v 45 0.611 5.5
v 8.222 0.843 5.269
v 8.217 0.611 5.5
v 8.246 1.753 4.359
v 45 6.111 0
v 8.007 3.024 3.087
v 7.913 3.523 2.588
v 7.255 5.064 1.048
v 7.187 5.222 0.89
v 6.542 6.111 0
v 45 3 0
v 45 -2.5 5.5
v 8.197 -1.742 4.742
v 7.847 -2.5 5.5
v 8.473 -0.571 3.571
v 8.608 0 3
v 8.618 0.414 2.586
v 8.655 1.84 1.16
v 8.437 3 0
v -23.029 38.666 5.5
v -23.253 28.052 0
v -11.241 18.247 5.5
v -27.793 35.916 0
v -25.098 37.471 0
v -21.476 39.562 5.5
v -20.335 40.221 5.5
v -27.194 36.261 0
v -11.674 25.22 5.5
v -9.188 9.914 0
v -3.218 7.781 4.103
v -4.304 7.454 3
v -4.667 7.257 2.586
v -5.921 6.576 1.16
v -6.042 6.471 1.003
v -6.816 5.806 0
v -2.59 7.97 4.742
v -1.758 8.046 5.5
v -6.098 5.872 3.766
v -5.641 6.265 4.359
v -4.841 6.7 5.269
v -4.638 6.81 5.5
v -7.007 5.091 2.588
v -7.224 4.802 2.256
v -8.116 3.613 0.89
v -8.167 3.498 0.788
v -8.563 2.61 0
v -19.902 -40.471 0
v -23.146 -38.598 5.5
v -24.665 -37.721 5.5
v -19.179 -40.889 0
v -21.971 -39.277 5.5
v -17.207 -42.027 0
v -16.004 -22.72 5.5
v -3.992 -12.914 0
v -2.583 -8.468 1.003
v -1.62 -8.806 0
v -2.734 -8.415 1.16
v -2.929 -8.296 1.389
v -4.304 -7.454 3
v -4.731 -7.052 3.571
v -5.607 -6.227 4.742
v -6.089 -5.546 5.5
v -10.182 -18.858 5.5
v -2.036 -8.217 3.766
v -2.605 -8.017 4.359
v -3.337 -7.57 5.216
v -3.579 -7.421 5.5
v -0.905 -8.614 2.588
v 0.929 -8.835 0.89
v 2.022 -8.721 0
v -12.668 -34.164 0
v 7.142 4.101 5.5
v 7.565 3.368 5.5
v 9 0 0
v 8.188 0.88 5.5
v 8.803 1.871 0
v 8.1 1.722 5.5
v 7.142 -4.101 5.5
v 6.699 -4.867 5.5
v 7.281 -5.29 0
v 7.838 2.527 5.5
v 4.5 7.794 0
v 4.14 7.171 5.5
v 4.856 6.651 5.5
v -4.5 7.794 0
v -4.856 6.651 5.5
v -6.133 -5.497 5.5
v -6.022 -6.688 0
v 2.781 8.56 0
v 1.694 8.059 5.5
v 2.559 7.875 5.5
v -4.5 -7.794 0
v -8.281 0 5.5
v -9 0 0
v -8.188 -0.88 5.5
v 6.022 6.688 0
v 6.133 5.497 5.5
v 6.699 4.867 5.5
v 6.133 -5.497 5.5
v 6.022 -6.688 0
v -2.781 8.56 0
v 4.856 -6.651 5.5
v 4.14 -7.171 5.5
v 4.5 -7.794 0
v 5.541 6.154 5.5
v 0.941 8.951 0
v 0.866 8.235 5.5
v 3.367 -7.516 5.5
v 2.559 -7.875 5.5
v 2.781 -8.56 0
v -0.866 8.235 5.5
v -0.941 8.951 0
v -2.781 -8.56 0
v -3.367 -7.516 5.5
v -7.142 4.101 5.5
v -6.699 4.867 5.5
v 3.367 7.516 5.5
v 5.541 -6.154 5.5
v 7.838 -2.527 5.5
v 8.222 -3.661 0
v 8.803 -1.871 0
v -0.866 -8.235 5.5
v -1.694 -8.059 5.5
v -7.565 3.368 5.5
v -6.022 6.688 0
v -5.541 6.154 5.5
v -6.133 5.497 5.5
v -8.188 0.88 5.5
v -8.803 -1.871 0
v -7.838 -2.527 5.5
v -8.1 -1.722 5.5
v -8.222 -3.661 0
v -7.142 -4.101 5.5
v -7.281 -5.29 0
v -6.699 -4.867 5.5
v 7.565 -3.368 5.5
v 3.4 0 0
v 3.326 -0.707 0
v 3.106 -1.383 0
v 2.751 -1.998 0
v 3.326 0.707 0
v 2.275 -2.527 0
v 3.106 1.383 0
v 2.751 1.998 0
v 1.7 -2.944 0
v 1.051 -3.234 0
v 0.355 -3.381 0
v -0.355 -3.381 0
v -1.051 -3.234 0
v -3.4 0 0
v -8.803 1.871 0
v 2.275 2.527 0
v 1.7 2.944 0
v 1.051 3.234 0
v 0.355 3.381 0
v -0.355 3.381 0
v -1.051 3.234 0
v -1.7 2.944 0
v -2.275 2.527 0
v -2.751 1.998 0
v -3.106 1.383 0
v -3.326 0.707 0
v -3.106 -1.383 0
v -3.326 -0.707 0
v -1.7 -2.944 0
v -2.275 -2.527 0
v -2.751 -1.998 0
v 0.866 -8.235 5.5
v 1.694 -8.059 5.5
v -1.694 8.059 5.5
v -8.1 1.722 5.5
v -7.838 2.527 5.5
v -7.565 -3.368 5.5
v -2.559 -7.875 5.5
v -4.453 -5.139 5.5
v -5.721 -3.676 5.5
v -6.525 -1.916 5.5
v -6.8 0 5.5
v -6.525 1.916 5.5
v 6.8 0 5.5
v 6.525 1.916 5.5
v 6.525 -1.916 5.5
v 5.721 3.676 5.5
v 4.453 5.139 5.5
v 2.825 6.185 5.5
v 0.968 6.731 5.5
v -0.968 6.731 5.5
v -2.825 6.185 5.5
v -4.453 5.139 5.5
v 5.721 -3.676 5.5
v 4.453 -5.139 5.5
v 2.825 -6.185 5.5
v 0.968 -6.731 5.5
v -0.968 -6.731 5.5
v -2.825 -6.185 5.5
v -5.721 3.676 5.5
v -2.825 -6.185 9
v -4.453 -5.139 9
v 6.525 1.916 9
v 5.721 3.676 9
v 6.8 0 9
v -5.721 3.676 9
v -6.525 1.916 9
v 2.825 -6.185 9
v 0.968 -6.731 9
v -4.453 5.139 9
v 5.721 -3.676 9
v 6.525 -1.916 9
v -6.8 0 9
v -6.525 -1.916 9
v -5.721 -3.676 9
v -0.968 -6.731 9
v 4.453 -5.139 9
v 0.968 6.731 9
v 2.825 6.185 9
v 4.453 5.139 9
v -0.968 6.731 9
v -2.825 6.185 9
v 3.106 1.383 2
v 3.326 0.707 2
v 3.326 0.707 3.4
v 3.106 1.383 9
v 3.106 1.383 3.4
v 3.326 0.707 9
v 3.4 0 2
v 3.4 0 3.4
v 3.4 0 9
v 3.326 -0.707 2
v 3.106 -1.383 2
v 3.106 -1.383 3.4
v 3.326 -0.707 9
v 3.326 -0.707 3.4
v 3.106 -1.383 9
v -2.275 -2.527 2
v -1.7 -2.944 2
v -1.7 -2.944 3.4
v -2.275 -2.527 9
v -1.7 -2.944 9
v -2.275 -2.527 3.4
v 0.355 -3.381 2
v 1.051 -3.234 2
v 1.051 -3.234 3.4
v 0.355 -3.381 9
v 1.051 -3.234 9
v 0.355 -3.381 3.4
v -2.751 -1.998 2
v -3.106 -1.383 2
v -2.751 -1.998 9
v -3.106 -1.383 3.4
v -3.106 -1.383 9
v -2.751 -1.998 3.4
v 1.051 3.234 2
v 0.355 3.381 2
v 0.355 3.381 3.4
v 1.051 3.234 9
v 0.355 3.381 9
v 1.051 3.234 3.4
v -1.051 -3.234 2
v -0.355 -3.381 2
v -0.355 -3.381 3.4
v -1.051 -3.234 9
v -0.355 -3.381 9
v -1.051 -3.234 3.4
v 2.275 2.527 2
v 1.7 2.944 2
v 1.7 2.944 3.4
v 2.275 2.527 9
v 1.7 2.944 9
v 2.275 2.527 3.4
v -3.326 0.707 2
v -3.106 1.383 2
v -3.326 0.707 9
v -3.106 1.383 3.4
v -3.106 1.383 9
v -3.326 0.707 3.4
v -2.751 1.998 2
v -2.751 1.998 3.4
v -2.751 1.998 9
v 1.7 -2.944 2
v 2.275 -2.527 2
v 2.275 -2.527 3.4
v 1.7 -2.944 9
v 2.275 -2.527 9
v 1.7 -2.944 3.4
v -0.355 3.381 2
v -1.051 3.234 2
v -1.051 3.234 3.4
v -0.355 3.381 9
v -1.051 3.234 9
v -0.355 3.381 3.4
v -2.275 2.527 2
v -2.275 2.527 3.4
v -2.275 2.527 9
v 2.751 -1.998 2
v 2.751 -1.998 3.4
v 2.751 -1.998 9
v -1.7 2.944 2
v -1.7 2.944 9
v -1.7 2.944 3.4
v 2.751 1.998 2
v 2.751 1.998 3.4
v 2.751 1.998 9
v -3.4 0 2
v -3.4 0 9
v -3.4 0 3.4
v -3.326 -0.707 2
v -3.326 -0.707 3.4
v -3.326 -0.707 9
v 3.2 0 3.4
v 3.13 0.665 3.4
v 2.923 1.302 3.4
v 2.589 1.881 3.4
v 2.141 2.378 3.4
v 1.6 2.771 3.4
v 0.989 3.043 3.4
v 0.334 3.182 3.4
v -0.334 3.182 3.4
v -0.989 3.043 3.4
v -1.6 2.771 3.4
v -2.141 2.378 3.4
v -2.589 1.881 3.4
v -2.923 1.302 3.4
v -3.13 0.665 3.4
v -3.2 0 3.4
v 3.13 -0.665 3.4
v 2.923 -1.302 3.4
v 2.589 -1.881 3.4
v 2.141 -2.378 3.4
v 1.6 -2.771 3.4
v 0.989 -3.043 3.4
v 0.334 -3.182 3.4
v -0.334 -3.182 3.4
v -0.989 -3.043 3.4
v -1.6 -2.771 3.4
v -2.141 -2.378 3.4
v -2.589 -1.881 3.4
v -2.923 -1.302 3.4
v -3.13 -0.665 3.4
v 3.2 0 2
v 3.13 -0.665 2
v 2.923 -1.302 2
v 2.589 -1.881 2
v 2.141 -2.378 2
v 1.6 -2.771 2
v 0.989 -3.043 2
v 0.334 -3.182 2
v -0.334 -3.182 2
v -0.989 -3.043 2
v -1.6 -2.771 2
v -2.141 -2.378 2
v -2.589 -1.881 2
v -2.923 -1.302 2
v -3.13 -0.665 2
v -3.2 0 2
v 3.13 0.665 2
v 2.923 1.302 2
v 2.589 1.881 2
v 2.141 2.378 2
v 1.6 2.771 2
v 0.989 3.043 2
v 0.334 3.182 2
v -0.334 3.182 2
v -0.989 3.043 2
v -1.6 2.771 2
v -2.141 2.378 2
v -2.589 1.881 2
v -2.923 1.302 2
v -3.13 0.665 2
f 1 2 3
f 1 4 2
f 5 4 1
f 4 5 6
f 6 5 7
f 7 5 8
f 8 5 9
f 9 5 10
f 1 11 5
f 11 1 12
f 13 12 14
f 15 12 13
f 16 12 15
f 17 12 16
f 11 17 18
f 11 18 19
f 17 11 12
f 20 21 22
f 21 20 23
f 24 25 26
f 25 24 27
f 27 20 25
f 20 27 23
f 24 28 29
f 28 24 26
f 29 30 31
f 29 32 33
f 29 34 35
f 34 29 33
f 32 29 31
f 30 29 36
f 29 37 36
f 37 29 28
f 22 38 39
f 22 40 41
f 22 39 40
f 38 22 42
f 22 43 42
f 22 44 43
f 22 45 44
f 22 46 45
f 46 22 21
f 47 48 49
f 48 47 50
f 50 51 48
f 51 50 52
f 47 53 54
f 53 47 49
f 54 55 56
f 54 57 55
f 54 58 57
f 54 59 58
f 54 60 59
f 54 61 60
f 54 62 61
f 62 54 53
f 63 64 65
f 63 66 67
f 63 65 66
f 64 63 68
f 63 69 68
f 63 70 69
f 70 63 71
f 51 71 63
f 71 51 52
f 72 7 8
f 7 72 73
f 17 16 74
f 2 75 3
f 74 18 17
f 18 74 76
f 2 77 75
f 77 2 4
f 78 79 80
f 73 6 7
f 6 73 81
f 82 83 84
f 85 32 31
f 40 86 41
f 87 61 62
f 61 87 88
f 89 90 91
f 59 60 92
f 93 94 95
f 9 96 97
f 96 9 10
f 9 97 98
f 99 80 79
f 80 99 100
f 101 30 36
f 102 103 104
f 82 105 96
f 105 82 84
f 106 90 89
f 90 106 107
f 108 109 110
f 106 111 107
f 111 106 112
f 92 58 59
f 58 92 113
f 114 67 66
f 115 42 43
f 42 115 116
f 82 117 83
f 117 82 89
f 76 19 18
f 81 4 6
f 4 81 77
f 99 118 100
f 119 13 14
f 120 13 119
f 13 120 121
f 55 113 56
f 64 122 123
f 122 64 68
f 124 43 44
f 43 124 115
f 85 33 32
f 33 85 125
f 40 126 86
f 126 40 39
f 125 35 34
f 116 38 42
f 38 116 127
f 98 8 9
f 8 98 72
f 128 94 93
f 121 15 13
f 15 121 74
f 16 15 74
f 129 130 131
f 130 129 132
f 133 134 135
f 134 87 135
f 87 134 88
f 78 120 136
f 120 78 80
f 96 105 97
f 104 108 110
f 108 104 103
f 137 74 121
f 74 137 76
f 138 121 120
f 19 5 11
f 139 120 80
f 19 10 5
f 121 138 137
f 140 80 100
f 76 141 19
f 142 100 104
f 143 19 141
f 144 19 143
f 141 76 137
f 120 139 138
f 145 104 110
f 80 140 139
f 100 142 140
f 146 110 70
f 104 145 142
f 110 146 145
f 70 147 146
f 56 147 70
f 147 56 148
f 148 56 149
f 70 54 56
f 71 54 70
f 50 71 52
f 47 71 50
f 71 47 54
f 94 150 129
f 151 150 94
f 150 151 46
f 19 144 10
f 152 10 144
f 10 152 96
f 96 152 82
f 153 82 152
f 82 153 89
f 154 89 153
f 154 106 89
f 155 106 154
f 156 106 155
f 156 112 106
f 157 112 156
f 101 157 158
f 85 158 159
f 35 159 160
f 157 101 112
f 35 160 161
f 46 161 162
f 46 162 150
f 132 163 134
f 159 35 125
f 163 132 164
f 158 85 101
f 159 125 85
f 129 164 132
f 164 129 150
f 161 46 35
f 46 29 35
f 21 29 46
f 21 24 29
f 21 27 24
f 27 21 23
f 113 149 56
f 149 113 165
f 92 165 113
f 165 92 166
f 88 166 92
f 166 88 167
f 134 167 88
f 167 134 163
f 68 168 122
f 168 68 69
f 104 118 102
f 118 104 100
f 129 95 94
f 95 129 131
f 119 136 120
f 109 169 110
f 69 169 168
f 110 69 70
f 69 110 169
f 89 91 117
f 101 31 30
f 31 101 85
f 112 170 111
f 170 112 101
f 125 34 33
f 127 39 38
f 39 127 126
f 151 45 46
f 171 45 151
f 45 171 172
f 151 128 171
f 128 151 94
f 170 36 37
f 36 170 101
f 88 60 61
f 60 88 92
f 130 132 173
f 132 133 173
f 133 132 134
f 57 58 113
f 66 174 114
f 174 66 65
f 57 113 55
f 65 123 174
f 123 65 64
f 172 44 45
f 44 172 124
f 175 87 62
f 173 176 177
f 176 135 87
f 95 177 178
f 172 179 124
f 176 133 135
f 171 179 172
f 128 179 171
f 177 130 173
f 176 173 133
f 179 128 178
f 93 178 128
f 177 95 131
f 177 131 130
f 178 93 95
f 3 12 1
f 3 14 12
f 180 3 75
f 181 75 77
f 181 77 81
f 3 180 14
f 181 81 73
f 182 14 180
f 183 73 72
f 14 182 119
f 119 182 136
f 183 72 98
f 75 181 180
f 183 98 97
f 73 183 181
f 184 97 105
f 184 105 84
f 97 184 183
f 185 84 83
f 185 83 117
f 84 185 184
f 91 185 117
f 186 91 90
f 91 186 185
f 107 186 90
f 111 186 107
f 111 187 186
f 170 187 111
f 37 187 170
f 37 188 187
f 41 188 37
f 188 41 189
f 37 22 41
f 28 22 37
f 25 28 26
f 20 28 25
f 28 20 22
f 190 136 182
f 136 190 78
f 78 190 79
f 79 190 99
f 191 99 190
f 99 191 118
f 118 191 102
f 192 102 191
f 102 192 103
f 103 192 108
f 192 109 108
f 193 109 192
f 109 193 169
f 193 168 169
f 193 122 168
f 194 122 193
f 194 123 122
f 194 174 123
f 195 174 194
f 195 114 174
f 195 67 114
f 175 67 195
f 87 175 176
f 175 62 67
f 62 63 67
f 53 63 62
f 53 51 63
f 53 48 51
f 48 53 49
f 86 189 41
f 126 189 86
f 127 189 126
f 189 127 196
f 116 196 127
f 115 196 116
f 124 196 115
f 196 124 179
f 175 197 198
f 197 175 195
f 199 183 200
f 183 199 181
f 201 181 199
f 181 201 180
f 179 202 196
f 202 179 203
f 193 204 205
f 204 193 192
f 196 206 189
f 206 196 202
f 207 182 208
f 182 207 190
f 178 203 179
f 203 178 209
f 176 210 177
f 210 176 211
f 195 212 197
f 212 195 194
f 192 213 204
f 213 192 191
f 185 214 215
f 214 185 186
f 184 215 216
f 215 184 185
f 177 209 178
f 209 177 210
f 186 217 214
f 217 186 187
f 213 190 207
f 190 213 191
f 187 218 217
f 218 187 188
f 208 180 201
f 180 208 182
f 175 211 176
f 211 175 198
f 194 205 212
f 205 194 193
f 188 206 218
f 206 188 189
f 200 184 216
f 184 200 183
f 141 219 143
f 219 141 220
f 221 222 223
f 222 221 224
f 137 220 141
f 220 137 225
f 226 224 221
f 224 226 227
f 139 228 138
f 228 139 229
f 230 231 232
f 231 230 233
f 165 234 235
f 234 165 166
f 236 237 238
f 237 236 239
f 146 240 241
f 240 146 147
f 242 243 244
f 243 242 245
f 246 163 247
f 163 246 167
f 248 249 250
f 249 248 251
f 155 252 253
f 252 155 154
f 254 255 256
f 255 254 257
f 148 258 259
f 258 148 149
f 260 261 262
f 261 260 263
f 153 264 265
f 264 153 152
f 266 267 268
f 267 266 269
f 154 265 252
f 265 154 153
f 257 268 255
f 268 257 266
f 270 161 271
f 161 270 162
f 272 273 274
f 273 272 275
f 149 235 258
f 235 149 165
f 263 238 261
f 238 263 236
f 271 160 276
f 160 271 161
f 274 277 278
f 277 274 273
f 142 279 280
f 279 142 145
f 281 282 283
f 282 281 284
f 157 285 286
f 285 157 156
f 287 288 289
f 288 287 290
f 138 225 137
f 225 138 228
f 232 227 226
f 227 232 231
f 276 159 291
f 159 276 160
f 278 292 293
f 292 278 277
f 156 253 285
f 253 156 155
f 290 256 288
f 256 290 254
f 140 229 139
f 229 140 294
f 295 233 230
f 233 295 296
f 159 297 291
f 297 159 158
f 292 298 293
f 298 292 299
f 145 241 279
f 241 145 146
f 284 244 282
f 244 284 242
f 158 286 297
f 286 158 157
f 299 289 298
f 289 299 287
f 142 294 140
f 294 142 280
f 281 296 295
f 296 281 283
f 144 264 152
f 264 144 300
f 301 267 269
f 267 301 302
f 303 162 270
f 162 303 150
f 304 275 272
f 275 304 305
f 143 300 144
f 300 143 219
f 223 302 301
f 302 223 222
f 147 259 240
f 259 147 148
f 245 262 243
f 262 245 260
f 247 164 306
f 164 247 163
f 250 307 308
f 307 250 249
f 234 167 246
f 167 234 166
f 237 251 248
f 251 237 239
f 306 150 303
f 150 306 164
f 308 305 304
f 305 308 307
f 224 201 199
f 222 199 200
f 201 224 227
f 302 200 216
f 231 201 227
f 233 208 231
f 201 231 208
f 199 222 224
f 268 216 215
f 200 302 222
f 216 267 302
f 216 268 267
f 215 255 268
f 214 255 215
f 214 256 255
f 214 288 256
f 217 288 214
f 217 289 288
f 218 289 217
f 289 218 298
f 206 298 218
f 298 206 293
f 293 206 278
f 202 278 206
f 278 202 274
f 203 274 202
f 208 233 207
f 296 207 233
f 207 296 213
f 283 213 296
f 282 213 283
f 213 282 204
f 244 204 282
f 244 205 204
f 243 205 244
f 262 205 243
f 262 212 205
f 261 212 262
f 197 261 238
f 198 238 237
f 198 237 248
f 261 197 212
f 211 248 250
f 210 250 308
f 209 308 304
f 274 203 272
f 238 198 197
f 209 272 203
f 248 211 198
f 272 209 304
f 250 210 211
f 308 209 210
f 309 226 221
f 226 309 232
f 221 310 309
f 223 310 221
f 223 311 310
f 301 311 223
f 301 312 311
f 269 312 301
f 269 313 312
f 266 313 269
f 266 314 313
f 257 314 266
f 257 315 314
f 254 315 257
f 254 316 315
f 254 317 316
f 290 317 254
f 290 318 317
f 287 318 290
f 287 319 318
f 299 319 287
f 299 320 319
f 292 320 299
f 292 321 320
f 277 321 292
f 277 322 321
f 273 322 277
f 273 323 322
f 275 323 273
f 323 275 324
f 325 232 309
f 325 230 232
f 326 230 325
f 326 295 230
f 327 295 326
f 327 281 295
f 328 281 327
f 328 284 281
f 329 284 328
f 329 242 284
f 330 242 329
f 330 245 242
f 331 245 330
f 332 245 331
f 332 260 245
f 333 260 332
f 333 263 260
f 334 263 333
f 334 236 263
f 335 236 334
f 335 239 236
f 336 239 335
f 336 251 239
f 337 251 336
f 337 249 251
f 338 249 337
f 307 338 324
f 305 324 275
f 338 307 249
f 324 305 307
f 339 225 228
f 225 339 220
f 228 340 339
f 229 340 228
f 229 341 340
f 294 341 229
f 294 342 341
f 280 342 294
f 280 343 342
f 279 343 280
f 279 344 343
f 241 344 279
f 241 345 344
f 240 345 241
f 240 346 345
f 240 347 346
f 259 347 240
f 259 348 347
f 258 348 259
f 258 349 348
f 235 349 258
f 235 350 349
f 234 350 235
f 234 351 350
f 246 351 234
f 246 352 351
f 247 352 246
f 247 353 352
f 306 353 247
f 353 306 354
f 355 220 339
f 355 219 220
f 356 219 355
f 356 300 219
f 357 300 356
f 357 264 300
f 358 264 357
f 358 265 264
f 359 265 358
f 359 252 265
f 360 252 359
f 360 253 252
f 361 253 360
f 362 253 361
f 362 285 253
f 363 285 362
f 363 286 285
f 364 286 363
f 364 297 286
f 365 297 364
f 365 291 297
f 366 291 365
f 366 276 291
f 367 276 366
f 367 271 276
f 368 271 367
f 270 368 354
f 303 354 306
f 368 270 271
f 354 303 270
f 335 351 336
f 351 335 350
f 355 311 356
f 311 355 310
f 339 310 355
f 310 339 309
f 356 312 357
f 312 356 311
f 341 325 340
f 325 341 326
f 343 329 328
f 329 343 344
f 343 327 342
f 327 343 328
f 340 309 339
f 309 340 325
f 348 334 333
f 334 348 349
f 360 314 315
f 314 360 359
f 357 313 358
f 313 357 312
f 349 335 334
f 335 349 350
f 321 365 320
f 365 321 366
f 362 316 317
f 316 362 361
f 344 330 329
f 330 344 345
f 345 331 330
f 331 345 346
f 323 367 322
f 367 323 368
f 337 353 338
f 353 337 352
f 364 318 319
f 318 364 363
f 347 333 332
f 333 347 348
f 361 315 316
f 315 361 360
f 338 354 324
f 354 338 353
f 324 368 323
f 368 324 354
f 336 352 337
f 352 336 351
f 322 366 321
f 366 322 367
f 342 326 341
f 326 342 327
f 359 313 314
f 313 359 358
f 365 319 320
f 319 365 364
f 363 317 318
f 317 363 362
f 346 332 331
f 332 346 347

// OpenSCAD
// preview[view:north east, tilt:top diagonal]

// How many blades?
blades = 3; // [1:1:75]

// Length of blades
length = 45; // [1:1:300]

// Depth of propeller
depth = 10; // [1:1:75]

// How thick shall the blades be?
t = 2.2; // [0.1:0.1:7]

// Center hole for the shaft
shaft = 6.8; // [0:0.1:20]

// Do you want one flat side in the shaft hole?
cut = 0; // [1:Yes,0:No]

// Add a nudge
donudge = 1; // [1:Yes,0:No]

// Add nudge at x mm
nudge = 1.4; // [0:0.1:75]

// Cut off the top
docuttop = 1; // [1:Yes,0:No]

// How much to cut off the top
cuttopheight = 4.5;

/* [Hidden] */
angle = 45;

difference() {   
    ///////////////////////
    // Draw these things //
    ///////////////////////
    union(){
        for (rotation =[0:360/blades:360]) {
            rotate([0,0,rotation]) {
                translate([0,8,-5]) {
                    rotate([angle,0,0]) {
                        // Draw blades
                        cube([length, t, depth/sin(angle)+10],false);
                    } // End rotate
                } // End translate       
            } // End rotate
        } // End for spaceW

    if (depth>20) {
        // Draw center cylinder for deep propellers
        cylinder(h=depth, r1=depth/4, r2=depth/3, center=false, $fn=40);
        } else {
        // Draw center cylinder for shallow propellers
        cylinder(h=depth, r1=9, r2=depth/1.3, center=false, $fn=30); 
        } // End else
    } // End union

    ///////////////////////////
    // Cut away these things //
    ///////////////////////////

    // Draw shaft hole
    translate([0,0,-1]) {
        cylinder(h=depth+1, r1=shaft/2, r2=shaft/2, center=false, $fn=30);
    } // End translate

    // Cut away bottom
    translate([0,0,-5]) {
        cube([1000, 1000, 10],true);
    } // End translate

    // Cut away top
    translate([-500,-500,depth-1]) {
        cube([1000, 1000, 10],false);
    } // End translate
    
    if (docuttop==1) {
        translate([0, 0, depth-cuttopheight]) {
            difference() {
                cylinder(h=cuttopheight, r=length+1);
                translate([0, 0, -0.1]) cylinder(h=cuttopheight+0.2, r=shaft);
            }
        }
    }

} // End difference

// Draw extra part in shaft hole if cut is choosen
if (cut==1) {
    translate([shaft/3,-shaft/2,0]) {
        cube([shaft/3, shaft, depth-1],false);
    } // End translate
} // End if cut

// Add nudge inside shaft
translate([0, 0, 2]) {
    difference() {
        cylinder(h=nudge, r=shaft, $fn=30);
        translate([0, 0, -0.1]) cylinder(h=nudge+0.2, r=(shaft/2)-0.2, $fn=30);
    }
}
